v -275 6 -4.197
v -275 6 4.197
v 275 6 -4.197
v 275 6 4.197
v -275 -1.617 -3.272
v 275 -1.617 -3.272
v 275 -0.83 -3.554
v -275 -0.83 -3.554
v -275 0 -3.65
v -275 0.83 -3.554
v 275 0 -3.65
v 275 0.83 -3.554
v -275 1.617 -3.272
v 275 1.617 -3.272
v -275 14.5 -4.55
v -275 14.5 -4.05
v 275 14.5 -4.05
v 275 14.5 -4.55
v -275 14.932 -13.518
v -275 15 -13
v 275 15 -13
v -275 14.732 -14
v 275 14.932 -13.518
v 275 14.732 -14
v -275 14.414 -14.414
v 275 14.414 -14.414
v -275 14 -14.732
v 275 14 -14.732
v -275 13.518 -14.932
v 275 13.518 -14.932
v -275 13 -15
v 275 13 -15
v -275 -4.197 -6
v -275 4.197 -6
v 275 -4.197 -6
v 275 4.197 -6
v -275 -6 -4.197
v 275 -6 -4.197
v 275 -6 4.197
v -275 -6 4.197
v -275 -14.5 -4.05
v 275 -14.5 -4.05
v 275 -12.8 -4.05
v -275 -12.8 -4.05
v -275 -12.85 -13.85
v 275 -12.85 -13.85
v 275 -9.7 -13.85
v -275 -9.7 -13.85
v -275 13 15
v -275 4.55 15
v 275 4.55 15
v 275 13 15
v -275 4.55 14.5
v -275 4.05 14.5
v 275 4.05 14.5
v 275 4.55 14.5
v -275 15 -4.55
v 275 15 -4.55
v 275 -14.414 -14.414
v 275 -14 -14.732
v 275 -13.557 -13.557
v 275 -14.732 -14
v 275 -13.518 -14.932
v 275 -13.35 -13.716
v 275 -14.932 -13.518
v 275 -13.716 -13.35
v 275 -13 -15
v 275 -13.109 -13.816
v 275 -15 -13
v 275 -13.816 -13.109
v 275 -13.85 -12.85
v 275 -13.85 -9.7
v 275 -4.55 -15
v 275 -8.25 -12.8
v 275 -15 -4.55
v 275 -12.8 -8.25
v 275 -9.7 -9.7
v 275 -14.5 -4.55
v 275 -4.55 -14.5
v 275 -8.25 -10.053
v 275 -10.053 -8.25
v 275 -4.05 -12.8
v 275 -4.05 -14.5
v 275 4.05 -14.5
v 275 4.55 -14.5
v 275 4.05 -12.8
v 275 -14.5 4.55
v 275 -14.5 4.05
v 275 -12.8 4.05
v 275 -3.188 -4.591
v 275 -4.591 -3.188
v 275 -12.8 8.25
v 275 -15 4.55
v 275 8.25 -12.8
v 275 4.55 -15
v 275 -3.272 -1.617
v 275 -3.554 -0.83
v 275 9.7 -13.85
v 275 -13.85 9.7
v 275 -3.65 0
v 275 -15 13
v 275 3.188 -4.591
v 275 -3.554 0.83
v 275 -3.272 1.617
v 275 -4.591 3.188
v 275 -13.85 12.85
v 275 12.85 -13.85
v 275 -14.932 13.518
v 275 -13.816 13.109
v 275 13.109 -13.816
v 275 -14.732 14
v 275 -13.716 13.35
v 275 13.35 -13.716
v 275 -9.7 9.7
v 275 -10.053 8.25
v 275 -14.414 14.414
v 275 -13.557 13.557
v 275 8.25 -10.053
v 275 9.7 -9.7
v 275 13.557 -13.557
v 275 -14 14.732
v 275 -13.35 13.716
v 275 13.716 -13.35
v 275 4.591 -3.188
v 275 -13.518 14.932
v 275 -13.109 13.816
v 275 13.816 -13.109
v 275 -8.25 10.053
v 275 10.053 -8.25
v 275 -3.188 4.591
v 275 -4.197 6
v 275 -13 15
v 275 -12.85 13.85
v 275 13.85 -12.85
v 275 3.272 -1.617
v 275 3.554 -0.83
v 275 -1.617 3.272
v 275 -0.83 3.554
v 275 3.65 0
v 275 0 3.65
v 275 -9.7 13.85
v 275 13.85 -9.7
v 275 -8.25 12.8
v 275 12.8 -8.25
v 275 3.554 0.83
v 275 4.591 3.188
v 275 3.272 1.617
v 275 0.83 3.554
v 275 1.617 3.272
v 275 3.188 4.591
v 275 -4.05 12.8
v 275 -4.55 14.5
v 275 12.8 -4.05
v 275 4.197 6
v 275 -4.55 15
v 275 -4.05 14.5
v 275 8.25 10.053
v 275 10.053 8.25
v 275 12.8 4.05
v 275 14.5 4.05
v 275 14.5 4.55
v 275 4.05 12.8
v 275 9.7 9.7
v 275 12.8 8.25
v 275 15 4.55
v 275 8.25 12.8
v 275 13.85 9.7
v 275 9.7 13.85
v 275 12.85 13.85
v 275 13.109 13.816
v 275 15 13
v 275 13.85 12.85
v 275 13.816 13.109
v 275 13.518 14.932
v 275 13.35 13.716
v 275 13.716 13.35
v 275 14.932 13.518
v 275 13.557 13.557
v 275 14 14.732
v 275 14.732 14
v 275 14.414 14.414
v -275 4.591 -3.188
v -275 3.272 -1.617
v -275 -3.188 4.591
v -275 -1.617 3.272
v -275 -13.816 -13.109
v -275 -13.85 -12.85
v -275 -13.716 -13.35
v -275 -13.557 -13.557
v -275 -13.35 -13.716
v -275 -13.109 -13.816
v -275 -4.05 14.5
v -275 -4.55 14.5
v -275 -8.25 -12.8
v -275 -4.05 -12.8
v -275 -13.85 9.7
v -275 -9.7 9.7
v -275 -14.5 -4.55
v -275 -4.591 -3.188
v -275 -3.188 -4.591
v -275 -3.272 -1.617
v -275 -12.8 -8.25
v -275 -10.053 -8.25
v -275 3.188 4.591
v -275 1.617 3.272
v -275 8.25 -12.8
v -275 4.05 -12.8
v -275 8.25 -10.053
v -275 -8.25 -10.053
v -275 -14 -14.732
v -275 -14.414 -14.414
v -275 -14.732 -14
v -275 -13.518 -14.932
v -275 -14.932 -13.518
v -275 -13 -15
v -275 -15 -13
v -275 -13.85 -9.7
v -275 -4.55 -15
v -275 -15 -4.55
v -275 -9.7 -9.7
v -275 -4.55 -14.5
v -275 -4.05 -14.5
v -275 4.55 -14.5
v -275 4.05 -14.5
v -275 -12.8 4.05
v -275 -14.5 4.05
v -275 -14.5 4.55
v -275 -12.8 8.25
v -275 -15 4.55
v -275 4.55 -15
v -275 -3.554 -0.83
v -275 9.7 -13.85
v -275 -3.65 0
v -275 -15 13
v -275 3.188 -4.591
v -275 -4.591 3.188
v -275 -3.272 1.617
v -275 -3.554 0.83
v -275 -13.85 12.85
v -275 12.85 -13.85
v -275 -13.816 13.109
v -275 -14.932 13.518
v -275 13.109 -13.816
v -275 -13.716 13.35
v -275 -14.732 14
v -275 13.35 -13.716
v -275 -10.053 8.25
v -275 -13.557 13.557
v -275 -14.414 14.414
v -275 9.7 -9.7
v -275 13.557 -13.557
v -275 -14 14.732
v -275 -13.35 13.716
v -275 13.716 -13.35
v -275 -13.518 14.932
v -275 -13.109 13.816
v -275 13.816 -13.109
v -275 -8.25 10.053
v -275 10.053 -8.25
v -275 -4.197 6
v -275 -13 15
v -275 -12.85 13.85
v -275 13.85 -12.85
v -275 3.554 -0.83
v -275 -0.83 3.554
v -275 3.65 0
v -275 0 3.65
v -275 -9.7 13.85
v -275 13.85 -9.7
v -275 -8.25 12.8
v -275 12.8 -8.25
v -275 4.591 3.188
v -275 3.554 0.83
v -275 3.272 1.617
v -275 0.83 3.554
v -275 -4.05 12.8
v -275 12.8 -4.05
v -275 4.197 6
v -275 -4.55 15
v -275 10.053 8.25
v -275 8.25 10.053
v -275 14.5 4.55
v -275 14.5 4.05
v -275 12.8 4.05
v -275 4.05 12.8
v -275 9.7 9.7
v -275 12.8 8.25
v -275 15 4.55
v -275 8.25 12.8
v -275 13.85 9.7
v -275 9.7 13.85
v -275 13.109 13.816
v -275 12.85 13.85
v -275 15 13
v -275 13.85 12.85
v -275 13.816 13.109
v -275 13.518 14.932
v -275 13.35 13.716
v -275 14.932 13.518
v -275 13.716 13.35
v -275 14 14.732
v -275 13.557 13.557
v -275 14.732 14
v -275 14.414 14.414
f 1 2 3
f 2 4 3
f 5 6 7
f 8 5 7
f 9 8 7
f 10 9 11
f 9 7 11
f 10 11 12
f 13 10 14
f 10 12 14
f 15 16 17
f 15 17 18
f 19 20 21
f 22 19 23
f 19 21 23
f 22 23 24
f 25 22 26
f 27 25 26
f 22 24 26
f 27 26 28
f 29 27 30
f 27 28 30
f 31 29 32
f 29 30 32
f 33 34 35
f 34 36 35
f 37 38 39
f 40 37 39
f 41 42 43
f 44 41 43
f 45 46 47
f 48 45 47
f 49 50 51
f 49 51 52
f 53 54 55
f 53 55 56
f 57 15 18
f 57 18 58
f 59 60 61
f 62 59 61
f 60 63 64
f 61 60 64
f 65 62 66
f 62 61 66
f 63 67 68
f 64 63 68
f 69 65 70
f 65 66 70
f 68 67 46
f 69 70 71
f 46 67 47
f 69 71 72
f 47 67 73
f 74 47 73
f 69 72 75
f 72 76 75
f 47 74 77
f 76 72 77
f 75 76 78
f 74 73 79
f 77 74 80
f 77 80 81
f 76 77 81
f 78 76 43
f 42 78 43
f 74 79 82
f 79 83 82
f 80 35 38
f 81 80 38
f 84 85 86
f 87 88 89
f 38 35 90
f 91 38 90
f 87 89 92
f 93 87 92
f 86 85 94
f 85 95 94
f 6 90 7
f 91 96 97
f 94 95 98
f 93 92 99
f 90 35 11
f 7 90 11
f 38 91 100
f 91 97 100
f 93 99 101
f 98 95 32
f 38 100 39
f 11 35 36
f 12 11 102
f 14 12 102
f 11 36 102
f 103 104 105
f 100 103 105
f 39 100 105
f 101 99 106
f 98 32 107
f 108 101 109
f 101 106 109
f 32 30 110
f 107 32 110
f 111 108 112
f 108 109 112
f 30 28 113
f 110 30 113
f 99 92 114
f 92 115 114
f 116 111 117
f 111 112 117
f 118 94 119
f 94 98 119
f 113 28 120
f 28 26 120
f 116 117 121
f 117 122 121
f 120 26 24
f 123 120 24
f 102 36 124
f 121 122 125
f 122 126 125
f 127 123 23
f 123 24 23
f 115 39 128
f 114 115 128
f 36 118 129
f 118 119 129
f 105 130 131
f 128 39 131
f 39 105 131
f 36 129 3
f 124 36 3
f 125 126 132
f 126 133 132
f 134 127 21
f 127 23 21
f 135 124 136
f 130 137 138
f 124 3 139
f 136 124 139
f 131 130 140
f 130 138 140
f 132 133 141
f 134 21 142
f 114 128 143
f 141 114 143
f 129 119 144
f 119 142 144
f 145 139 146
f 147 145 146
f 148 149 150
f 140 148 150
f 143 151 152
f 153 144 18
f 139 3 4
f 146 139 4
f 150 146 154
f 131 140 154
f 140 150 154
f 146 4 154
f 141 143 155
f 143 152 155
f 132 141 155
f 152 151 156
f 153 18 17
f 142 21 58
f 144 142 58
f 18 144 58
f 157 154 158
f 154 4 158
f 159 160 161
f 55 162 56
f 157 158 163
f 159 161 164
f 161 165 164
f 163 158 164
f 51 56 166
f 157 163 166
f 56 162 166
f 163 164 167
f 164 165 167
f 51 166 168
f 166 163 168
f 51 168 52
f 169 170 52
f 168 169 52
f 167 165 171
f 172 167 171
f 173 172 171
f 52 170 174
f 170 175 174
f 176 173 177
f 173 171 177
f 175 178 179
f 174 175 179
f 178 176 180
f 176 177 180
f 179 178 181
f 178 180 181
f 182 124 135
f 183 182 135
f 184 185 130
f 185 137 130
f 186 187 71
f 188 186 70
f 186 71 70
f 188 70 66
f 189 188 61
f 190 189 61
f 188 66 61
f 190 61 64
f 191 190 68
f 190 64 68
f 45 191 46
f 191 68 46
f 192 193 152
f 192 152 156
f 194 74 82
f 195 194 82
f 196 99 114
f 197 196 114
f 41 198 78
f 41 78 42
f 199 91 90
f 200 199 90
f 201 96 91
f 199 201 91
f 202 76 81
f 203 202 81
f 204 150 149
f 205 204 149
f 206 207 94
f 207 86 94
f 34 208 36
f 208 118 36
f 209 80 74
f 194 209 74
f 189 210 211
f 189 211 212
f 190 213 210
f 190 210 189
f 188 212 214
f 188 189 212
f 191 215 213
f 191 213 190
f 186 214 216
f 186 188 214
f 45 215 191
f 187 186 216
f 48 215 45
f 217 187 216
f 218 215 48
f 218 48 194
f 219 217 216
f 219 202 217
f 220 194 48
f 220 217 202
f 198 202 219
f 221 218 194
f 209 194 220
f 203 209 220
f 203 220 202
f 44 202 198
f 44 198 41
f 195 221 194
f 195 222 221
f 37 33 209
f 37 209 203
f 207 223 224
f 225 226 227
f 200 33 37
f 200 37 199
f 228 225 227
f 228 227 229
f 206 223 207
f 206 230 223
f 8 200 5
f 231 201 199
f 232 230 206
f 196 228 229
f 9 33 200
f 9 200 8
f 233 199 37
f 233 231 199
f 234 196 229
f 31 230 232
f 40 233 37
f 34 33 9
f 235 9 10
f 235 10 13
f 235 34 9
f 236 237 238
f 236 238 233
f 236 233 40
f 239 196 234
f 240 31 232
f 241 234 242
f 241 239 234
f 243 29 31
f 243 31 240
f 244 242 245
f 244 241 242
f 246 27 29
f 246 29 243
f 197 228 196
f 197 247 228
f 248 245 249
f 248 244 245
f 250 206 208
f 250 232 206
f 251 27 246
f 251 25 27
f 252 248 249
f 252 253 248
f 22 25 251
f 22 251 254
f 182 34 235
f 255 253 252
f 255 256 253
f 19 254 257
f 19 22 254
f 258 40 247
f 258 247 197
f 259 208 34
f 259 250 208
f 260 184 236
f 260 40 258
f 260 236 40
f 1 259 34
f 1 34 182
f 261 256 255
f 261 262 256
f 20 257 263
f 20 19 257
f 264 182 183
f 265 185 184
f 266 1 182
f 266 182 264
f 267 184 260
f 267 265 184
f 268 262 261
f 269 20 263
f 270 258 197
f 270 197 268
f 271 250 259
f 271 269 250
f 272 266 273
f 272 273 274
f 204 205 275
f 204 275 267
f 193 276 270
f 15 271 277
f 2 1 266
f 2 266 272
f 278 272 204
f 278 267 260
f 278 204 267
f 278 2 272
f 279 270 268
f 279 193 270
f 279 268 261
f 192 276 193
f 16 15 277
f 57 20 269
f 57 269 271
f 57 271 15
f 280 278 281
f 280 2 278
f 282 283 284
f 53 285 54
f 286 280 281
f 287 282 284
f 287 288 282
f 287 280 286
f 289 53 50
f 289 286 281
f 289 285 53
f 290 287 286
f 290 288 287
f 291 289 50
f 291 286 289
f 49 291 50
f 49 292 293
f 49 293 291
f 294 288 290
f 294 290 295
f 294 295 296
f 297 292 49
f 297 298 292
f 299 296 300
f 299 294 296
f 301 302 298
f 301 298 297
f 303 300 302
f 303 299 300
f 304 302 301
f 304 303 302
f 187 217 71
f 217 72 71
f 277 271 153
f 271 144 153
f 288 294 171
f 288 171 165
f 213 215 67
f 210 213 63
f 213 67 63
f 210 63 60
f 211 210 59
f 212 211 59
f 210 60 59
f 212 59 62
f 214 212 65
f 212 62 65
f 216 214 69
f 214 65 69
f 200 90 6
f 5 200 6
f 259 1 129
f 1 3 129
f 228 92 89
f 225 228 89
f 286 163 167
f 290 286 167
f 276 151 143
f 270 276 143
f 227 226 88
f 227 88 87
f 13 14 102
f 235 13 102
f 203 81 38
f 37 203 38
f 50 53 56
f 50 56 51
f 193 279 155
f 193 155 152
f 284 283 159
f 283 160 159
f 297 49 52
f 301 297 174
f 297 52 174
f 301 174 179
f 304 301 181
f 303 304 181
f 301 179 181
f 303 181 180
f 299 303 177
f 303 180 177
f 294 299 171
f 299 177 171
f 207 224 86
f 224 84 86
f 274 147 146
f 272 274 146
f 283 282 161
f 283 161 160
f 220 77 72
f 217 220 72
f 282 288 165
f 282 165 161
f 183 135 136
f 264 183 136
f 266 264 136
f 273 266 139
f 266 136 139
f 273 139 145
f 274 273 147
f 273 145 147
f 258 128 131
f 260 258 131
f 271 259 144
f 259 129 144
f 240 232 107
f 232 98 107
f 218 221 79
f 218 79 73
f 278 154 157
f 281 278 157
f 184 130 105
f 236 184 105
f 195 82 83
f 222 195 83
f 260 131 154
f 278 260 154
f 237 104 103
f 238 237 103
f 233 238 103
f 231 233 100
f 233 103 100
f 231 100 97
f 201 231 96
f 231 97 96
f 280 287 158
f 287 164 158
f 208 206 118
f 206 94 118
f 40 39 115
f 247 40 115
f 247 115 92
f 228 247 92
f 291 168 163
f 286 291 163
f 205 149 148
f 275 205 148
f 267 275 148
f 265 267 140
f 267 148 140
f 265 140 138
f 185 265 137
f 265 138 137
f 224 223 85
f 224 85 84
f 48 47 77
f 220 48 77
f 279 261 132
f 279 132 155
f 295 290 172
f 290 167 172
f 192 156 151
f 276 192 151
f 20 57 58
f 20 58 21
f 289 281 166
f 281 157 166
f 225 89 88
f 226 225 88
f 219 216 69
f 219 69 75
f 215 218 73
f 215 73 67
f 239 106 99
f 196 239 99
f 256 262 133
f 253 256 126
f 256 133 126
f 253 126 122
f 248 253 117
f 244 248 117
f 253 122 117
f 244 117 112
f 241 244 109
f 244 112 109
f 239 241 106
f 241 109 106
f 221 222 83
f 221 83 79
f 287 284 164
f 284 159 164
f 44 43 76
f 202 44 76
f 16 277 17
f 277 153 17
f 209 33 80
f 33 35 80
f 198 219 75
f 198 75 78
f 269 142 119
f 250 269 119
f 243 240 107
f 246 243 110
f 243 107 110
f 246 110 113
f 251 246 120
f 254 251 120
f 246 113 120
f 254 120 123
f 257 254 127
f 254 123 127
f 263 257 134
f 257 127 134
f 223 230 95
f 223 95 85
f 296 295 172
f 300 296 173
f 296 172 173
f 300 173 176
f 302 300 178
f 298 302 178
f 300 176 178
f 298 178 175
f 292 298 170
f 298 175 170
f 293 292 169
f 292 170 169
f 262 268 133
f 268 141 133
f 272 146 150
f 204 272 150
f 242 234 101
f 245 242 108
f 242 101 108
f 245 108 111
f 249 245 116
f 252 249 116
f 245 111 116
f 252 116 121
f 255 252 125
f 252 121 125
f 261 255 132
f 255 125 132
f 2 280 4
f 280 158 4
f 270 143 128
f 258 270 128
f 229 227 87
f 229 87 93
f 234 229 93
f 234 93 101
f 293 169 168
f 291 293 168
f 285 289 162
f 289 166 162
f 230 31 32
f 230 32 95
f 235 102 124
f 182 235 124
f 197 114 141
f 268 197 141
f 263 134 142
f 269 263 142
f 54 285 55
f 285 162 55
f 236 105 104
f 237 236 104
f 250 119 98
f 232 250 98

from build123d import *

# Parameters (mm, degrees)
BR_EXTRUDE_DEPTH      = 275
BR_EXTRUDE_DEPTH_BACK = 275


with BuildPart() as part:
    # Sketch2 → BR_Extrude (new body, two sides)
    with BuildSketch(Plane(origin=(0, 0, 0), x_dir=(0, 0, -1), z_dir=(1, 0, 0))) as br_extrude_sk:
        with BuildLine():
            Line((-6, 4.196877708), (-10.053122292, 8.25))
            Line((-10.053122292, 8.25), (-12.8, 8.25))
            Line((-12.8, 8.25), (-12.800036742, 4.05))
            Line((-12.800036742, 4.05), (-14.5, 4.05))
            Line((-14.5, 4.05), (-14.5, 4.55))
            Line((-14.5, 4.55), (-15, 4.55))
            Line((-15, 4.55), (-15, 13))
            ThreePointArc((-15, 13), (-14.414213562, 14.414213562), (-13, 15))
            Line((-13, 15), (-4.55, 15))
            Line((-4.55, 15), (-4.55, 14.5))
            Line((-4.55, 14.5), (-4.05, 14.5))
            Line((-4.05, 14.5), (-4.05, 12.800036742))
            Line((-4.05, 12.800036742), (-8.25, 12.8))
            Line((-8.25, 12.8), (-8.25, 10.053122292))
            Line((-8.25, 10.053122292), (-4.196877708, 6))
            Line((-4.196877708, 6), (4.196877708, 6))
            Line((4.196877708, 6), (8.25, 10.053122292))
            Line((8.25, 10.053122292), (8.25, 12.8))
            Line((8.25, 12.8), (4.05, 12.800036742))
            Line((4.05, 12.800036742), (4.05, 14.5))
            Line((4.05, 14.5), (4.55, 14.5))
            Line((4.55, 14.5), (4.55, 15))
            Line((4.55, 15), (13, 15))
            ThreePointArc((13, 15), (14.414213562, 14.414213562), (15, 13))
            Line((15, 13), (15, 4.55))
            Line((15, 4.55), (14.5, 4.55))
            Line((14.5, 4.55), (14.5, 4.05))
            Line((14.5, 4.05), (12.800036742, 4.05))
            Line((12.800036742, 4.05), (12.8, 8.25))
            Line((12.8, 8.25), (10.053122292, 8.25))
            Line((10.053122292, 8.25), (6, 4.196877708))
            Line((6, 4.196877708), (6, -4.196877708))
            Line((6, -4.196877708), (10.053122292, -8.25))
            Line((10.053122292, -8.25), (12.8, -8.25))
            Line((12.8, -8.25), (12.800036742, -4.05))
            Line((12.800036742, -4.05), (14.5, -4.05))
            Line((14.5, -4.05), (14.5, -4.55))
            Line((14.5, -4.55), (15, -4.55))
            Line((15, -4.55), (15, -13))
            ThreePointArc((15, -13), (14.414213562, -14.414213562), (13, -15))
            Line((13, -15), (4.55, -15))
            Line((4.55, -15), (4.55, -14.5))
            Line((4.55, -14.5), (4.05, -14.5))
            Line((4.05, -14.5), (4.05, -12.800036742))
            Line((4.05, -12.800036742), (8.25, -12.8))
            Line((8.25, -12.8), (8.25, -10.053122292))
            Line((8.25, -10.053122292), (4.196877708, -6))
            Line((4.196877708, -6), (-4.196877708, -6))
            Line((-4.196877708, -6), (-8.25, -10.053122292))
            Line((-8.25, -10.053122292), (-8.25, -12.8))
            Line((-8.25, -12.8), (-4.05, -12.800036742))
            Line((-4.05, -12.800036742), (-4.05, -14.5))
            Line((-4.05, -14.5), (-4.55, -14.5))
            Line((-4.55, -14.5), (-4.55, -15))
            Line((-4.55, -15), (-13, -15))
            ThreePointArc((-13, -15), (-14.414213562, -14.414213562), (-15, -13))
            Line((-15, -13), (-15, -4.55))
            Line((-15, -4.55), (-14.5, -4.55))
            Line((-14.5, -4.55), (-14.5, -4.05))
            Line((-14.5, -4.05), (-12.800036742, -4.05))
            Line((-12.800036742, -4.05), (-12.8, -8.25))
            Line((-12.8, -8.25), (-10.053122292, -8.25))
            Line((-10.053122292, -8.25), (-6, -4.196877708))
            Line((-6, -4.196877708), (-6, 4.196877708))
        make_face()
        with BuildLine():
            Line((-13.85, -9.7), (-13.85, -12.85))
            ThreePointArc((-13.85, -12.85), (-13.557106781, -13.557106781), (-12.85, -13.85))
            Line((-12.85, -13.85), (-9.7, -13.85))
            Line((-9.7, -13.85), (-9.7, -9.7))
            Line((-9.7, -9.7), (-13.85, -9.7))
        make_face(mode=Mode.SUBTRACT)
        with BuildLine():
            Line((9.7, -13.85), (12.85, -13.85))
            ThreePointArc((12.85, -13.85), (13.557106781, -13.557106781), (13.85, -12.85))
            Line((13.85, -12.85), (13.85, -9.7))
            Line((13.85, -9.7), (9.7, -9.7))
            Line((9.7, -9.7), (9.7, -13.85))
        make_face(mode=Mode.SUBTRACT)
        with BuildLine():
            Line((13.85, 9.7), (13.85, 12.85))
            ThreePointArc((13.85, 12.85), (13.557106781, 13.557106781), (12.85, 13.85))
            Line((12.85, 13.85), (9.7, 13.85))
            Line((9.7, 13.85), (9.7, 9.7))
            Line((9.7, 9.7), (13.85, 9.7))
        make_face(mode=Mode.SUBTRACT)
        with BuildLine():
            Line((-9.7, 13.85), (-12.85, 13.85))
            ThreePointArc((-12.85, 13.85), (-13.557106781, 13.557106781), (-13.85, 12.85))
            Line((-13.85, 12.85), (-13.85, 9.7))
            Line((-13.85, 9.7), (-9.7, 9.7))
            Line((-9.7, 9.7), (-9.7, 13.85))
        make_face(mode=Mode.SUBTRACT)
        with BuildLine():
            Line((-3.272394192, -1.616767223), (-4.59052283, -3.187651763))
            Line((-4.59052283, -3.187651763), (-3.187651763, -4.59052283))
            Line((-3.187651763, -4.59052283), (-1.616767223, -3.272394192))
            ThreePointArc((-1.616767223, -3.272394192), (0, -3.65), (1.616767223, -3.272394192))
            Line((1.616767223, -3.272394192), (3.187651763, -4.59052283))
            Line((3.187651763, -4.59052283), (4.59052283, -3.187651763))
            Line((4.59052283, -3.187651763), (3.272394192, -1.616767223))
            ThreePointArc((3.272394192, -1.616767223), (3.65, 0), (3.272394192, 1.616767223))
            Line((3.272394192, 1.616767223), (4.59052283, 3.187651763))
            Line((4.59052283, 3.187651763), (3.187651763, 4.59052283))
            Line((3.187651763, 4.59052283), (1.616767223, 3.272394192))
            ThreePointArc((1.616767223, 3.272394192), (0, 3.65), (-1.616767223, 3.272394192))
            Line((-1.616767223, 3.272394192), (-3.187651763, 4.59052283))
            Line((-3.187651763, 4.59052283), (-4.59052283, 3.187651763))
            Line((-4.59052283, 3.187651763), (-3.272394192, 1.616767223))
            ThreePointArc((-3.272394192, 1.616767223), (-3.65, 0), (-3.272394192, -1.616767223))
        make_face(mode=Mode.SUBTRACT)
    extrude(amount=BR_EXTRUDE_DEPTH)
    extrude(br_extrude_sk.sketch, amount=-BR_EXTRUDE_DEPTH_BACK)


solid = part.part
